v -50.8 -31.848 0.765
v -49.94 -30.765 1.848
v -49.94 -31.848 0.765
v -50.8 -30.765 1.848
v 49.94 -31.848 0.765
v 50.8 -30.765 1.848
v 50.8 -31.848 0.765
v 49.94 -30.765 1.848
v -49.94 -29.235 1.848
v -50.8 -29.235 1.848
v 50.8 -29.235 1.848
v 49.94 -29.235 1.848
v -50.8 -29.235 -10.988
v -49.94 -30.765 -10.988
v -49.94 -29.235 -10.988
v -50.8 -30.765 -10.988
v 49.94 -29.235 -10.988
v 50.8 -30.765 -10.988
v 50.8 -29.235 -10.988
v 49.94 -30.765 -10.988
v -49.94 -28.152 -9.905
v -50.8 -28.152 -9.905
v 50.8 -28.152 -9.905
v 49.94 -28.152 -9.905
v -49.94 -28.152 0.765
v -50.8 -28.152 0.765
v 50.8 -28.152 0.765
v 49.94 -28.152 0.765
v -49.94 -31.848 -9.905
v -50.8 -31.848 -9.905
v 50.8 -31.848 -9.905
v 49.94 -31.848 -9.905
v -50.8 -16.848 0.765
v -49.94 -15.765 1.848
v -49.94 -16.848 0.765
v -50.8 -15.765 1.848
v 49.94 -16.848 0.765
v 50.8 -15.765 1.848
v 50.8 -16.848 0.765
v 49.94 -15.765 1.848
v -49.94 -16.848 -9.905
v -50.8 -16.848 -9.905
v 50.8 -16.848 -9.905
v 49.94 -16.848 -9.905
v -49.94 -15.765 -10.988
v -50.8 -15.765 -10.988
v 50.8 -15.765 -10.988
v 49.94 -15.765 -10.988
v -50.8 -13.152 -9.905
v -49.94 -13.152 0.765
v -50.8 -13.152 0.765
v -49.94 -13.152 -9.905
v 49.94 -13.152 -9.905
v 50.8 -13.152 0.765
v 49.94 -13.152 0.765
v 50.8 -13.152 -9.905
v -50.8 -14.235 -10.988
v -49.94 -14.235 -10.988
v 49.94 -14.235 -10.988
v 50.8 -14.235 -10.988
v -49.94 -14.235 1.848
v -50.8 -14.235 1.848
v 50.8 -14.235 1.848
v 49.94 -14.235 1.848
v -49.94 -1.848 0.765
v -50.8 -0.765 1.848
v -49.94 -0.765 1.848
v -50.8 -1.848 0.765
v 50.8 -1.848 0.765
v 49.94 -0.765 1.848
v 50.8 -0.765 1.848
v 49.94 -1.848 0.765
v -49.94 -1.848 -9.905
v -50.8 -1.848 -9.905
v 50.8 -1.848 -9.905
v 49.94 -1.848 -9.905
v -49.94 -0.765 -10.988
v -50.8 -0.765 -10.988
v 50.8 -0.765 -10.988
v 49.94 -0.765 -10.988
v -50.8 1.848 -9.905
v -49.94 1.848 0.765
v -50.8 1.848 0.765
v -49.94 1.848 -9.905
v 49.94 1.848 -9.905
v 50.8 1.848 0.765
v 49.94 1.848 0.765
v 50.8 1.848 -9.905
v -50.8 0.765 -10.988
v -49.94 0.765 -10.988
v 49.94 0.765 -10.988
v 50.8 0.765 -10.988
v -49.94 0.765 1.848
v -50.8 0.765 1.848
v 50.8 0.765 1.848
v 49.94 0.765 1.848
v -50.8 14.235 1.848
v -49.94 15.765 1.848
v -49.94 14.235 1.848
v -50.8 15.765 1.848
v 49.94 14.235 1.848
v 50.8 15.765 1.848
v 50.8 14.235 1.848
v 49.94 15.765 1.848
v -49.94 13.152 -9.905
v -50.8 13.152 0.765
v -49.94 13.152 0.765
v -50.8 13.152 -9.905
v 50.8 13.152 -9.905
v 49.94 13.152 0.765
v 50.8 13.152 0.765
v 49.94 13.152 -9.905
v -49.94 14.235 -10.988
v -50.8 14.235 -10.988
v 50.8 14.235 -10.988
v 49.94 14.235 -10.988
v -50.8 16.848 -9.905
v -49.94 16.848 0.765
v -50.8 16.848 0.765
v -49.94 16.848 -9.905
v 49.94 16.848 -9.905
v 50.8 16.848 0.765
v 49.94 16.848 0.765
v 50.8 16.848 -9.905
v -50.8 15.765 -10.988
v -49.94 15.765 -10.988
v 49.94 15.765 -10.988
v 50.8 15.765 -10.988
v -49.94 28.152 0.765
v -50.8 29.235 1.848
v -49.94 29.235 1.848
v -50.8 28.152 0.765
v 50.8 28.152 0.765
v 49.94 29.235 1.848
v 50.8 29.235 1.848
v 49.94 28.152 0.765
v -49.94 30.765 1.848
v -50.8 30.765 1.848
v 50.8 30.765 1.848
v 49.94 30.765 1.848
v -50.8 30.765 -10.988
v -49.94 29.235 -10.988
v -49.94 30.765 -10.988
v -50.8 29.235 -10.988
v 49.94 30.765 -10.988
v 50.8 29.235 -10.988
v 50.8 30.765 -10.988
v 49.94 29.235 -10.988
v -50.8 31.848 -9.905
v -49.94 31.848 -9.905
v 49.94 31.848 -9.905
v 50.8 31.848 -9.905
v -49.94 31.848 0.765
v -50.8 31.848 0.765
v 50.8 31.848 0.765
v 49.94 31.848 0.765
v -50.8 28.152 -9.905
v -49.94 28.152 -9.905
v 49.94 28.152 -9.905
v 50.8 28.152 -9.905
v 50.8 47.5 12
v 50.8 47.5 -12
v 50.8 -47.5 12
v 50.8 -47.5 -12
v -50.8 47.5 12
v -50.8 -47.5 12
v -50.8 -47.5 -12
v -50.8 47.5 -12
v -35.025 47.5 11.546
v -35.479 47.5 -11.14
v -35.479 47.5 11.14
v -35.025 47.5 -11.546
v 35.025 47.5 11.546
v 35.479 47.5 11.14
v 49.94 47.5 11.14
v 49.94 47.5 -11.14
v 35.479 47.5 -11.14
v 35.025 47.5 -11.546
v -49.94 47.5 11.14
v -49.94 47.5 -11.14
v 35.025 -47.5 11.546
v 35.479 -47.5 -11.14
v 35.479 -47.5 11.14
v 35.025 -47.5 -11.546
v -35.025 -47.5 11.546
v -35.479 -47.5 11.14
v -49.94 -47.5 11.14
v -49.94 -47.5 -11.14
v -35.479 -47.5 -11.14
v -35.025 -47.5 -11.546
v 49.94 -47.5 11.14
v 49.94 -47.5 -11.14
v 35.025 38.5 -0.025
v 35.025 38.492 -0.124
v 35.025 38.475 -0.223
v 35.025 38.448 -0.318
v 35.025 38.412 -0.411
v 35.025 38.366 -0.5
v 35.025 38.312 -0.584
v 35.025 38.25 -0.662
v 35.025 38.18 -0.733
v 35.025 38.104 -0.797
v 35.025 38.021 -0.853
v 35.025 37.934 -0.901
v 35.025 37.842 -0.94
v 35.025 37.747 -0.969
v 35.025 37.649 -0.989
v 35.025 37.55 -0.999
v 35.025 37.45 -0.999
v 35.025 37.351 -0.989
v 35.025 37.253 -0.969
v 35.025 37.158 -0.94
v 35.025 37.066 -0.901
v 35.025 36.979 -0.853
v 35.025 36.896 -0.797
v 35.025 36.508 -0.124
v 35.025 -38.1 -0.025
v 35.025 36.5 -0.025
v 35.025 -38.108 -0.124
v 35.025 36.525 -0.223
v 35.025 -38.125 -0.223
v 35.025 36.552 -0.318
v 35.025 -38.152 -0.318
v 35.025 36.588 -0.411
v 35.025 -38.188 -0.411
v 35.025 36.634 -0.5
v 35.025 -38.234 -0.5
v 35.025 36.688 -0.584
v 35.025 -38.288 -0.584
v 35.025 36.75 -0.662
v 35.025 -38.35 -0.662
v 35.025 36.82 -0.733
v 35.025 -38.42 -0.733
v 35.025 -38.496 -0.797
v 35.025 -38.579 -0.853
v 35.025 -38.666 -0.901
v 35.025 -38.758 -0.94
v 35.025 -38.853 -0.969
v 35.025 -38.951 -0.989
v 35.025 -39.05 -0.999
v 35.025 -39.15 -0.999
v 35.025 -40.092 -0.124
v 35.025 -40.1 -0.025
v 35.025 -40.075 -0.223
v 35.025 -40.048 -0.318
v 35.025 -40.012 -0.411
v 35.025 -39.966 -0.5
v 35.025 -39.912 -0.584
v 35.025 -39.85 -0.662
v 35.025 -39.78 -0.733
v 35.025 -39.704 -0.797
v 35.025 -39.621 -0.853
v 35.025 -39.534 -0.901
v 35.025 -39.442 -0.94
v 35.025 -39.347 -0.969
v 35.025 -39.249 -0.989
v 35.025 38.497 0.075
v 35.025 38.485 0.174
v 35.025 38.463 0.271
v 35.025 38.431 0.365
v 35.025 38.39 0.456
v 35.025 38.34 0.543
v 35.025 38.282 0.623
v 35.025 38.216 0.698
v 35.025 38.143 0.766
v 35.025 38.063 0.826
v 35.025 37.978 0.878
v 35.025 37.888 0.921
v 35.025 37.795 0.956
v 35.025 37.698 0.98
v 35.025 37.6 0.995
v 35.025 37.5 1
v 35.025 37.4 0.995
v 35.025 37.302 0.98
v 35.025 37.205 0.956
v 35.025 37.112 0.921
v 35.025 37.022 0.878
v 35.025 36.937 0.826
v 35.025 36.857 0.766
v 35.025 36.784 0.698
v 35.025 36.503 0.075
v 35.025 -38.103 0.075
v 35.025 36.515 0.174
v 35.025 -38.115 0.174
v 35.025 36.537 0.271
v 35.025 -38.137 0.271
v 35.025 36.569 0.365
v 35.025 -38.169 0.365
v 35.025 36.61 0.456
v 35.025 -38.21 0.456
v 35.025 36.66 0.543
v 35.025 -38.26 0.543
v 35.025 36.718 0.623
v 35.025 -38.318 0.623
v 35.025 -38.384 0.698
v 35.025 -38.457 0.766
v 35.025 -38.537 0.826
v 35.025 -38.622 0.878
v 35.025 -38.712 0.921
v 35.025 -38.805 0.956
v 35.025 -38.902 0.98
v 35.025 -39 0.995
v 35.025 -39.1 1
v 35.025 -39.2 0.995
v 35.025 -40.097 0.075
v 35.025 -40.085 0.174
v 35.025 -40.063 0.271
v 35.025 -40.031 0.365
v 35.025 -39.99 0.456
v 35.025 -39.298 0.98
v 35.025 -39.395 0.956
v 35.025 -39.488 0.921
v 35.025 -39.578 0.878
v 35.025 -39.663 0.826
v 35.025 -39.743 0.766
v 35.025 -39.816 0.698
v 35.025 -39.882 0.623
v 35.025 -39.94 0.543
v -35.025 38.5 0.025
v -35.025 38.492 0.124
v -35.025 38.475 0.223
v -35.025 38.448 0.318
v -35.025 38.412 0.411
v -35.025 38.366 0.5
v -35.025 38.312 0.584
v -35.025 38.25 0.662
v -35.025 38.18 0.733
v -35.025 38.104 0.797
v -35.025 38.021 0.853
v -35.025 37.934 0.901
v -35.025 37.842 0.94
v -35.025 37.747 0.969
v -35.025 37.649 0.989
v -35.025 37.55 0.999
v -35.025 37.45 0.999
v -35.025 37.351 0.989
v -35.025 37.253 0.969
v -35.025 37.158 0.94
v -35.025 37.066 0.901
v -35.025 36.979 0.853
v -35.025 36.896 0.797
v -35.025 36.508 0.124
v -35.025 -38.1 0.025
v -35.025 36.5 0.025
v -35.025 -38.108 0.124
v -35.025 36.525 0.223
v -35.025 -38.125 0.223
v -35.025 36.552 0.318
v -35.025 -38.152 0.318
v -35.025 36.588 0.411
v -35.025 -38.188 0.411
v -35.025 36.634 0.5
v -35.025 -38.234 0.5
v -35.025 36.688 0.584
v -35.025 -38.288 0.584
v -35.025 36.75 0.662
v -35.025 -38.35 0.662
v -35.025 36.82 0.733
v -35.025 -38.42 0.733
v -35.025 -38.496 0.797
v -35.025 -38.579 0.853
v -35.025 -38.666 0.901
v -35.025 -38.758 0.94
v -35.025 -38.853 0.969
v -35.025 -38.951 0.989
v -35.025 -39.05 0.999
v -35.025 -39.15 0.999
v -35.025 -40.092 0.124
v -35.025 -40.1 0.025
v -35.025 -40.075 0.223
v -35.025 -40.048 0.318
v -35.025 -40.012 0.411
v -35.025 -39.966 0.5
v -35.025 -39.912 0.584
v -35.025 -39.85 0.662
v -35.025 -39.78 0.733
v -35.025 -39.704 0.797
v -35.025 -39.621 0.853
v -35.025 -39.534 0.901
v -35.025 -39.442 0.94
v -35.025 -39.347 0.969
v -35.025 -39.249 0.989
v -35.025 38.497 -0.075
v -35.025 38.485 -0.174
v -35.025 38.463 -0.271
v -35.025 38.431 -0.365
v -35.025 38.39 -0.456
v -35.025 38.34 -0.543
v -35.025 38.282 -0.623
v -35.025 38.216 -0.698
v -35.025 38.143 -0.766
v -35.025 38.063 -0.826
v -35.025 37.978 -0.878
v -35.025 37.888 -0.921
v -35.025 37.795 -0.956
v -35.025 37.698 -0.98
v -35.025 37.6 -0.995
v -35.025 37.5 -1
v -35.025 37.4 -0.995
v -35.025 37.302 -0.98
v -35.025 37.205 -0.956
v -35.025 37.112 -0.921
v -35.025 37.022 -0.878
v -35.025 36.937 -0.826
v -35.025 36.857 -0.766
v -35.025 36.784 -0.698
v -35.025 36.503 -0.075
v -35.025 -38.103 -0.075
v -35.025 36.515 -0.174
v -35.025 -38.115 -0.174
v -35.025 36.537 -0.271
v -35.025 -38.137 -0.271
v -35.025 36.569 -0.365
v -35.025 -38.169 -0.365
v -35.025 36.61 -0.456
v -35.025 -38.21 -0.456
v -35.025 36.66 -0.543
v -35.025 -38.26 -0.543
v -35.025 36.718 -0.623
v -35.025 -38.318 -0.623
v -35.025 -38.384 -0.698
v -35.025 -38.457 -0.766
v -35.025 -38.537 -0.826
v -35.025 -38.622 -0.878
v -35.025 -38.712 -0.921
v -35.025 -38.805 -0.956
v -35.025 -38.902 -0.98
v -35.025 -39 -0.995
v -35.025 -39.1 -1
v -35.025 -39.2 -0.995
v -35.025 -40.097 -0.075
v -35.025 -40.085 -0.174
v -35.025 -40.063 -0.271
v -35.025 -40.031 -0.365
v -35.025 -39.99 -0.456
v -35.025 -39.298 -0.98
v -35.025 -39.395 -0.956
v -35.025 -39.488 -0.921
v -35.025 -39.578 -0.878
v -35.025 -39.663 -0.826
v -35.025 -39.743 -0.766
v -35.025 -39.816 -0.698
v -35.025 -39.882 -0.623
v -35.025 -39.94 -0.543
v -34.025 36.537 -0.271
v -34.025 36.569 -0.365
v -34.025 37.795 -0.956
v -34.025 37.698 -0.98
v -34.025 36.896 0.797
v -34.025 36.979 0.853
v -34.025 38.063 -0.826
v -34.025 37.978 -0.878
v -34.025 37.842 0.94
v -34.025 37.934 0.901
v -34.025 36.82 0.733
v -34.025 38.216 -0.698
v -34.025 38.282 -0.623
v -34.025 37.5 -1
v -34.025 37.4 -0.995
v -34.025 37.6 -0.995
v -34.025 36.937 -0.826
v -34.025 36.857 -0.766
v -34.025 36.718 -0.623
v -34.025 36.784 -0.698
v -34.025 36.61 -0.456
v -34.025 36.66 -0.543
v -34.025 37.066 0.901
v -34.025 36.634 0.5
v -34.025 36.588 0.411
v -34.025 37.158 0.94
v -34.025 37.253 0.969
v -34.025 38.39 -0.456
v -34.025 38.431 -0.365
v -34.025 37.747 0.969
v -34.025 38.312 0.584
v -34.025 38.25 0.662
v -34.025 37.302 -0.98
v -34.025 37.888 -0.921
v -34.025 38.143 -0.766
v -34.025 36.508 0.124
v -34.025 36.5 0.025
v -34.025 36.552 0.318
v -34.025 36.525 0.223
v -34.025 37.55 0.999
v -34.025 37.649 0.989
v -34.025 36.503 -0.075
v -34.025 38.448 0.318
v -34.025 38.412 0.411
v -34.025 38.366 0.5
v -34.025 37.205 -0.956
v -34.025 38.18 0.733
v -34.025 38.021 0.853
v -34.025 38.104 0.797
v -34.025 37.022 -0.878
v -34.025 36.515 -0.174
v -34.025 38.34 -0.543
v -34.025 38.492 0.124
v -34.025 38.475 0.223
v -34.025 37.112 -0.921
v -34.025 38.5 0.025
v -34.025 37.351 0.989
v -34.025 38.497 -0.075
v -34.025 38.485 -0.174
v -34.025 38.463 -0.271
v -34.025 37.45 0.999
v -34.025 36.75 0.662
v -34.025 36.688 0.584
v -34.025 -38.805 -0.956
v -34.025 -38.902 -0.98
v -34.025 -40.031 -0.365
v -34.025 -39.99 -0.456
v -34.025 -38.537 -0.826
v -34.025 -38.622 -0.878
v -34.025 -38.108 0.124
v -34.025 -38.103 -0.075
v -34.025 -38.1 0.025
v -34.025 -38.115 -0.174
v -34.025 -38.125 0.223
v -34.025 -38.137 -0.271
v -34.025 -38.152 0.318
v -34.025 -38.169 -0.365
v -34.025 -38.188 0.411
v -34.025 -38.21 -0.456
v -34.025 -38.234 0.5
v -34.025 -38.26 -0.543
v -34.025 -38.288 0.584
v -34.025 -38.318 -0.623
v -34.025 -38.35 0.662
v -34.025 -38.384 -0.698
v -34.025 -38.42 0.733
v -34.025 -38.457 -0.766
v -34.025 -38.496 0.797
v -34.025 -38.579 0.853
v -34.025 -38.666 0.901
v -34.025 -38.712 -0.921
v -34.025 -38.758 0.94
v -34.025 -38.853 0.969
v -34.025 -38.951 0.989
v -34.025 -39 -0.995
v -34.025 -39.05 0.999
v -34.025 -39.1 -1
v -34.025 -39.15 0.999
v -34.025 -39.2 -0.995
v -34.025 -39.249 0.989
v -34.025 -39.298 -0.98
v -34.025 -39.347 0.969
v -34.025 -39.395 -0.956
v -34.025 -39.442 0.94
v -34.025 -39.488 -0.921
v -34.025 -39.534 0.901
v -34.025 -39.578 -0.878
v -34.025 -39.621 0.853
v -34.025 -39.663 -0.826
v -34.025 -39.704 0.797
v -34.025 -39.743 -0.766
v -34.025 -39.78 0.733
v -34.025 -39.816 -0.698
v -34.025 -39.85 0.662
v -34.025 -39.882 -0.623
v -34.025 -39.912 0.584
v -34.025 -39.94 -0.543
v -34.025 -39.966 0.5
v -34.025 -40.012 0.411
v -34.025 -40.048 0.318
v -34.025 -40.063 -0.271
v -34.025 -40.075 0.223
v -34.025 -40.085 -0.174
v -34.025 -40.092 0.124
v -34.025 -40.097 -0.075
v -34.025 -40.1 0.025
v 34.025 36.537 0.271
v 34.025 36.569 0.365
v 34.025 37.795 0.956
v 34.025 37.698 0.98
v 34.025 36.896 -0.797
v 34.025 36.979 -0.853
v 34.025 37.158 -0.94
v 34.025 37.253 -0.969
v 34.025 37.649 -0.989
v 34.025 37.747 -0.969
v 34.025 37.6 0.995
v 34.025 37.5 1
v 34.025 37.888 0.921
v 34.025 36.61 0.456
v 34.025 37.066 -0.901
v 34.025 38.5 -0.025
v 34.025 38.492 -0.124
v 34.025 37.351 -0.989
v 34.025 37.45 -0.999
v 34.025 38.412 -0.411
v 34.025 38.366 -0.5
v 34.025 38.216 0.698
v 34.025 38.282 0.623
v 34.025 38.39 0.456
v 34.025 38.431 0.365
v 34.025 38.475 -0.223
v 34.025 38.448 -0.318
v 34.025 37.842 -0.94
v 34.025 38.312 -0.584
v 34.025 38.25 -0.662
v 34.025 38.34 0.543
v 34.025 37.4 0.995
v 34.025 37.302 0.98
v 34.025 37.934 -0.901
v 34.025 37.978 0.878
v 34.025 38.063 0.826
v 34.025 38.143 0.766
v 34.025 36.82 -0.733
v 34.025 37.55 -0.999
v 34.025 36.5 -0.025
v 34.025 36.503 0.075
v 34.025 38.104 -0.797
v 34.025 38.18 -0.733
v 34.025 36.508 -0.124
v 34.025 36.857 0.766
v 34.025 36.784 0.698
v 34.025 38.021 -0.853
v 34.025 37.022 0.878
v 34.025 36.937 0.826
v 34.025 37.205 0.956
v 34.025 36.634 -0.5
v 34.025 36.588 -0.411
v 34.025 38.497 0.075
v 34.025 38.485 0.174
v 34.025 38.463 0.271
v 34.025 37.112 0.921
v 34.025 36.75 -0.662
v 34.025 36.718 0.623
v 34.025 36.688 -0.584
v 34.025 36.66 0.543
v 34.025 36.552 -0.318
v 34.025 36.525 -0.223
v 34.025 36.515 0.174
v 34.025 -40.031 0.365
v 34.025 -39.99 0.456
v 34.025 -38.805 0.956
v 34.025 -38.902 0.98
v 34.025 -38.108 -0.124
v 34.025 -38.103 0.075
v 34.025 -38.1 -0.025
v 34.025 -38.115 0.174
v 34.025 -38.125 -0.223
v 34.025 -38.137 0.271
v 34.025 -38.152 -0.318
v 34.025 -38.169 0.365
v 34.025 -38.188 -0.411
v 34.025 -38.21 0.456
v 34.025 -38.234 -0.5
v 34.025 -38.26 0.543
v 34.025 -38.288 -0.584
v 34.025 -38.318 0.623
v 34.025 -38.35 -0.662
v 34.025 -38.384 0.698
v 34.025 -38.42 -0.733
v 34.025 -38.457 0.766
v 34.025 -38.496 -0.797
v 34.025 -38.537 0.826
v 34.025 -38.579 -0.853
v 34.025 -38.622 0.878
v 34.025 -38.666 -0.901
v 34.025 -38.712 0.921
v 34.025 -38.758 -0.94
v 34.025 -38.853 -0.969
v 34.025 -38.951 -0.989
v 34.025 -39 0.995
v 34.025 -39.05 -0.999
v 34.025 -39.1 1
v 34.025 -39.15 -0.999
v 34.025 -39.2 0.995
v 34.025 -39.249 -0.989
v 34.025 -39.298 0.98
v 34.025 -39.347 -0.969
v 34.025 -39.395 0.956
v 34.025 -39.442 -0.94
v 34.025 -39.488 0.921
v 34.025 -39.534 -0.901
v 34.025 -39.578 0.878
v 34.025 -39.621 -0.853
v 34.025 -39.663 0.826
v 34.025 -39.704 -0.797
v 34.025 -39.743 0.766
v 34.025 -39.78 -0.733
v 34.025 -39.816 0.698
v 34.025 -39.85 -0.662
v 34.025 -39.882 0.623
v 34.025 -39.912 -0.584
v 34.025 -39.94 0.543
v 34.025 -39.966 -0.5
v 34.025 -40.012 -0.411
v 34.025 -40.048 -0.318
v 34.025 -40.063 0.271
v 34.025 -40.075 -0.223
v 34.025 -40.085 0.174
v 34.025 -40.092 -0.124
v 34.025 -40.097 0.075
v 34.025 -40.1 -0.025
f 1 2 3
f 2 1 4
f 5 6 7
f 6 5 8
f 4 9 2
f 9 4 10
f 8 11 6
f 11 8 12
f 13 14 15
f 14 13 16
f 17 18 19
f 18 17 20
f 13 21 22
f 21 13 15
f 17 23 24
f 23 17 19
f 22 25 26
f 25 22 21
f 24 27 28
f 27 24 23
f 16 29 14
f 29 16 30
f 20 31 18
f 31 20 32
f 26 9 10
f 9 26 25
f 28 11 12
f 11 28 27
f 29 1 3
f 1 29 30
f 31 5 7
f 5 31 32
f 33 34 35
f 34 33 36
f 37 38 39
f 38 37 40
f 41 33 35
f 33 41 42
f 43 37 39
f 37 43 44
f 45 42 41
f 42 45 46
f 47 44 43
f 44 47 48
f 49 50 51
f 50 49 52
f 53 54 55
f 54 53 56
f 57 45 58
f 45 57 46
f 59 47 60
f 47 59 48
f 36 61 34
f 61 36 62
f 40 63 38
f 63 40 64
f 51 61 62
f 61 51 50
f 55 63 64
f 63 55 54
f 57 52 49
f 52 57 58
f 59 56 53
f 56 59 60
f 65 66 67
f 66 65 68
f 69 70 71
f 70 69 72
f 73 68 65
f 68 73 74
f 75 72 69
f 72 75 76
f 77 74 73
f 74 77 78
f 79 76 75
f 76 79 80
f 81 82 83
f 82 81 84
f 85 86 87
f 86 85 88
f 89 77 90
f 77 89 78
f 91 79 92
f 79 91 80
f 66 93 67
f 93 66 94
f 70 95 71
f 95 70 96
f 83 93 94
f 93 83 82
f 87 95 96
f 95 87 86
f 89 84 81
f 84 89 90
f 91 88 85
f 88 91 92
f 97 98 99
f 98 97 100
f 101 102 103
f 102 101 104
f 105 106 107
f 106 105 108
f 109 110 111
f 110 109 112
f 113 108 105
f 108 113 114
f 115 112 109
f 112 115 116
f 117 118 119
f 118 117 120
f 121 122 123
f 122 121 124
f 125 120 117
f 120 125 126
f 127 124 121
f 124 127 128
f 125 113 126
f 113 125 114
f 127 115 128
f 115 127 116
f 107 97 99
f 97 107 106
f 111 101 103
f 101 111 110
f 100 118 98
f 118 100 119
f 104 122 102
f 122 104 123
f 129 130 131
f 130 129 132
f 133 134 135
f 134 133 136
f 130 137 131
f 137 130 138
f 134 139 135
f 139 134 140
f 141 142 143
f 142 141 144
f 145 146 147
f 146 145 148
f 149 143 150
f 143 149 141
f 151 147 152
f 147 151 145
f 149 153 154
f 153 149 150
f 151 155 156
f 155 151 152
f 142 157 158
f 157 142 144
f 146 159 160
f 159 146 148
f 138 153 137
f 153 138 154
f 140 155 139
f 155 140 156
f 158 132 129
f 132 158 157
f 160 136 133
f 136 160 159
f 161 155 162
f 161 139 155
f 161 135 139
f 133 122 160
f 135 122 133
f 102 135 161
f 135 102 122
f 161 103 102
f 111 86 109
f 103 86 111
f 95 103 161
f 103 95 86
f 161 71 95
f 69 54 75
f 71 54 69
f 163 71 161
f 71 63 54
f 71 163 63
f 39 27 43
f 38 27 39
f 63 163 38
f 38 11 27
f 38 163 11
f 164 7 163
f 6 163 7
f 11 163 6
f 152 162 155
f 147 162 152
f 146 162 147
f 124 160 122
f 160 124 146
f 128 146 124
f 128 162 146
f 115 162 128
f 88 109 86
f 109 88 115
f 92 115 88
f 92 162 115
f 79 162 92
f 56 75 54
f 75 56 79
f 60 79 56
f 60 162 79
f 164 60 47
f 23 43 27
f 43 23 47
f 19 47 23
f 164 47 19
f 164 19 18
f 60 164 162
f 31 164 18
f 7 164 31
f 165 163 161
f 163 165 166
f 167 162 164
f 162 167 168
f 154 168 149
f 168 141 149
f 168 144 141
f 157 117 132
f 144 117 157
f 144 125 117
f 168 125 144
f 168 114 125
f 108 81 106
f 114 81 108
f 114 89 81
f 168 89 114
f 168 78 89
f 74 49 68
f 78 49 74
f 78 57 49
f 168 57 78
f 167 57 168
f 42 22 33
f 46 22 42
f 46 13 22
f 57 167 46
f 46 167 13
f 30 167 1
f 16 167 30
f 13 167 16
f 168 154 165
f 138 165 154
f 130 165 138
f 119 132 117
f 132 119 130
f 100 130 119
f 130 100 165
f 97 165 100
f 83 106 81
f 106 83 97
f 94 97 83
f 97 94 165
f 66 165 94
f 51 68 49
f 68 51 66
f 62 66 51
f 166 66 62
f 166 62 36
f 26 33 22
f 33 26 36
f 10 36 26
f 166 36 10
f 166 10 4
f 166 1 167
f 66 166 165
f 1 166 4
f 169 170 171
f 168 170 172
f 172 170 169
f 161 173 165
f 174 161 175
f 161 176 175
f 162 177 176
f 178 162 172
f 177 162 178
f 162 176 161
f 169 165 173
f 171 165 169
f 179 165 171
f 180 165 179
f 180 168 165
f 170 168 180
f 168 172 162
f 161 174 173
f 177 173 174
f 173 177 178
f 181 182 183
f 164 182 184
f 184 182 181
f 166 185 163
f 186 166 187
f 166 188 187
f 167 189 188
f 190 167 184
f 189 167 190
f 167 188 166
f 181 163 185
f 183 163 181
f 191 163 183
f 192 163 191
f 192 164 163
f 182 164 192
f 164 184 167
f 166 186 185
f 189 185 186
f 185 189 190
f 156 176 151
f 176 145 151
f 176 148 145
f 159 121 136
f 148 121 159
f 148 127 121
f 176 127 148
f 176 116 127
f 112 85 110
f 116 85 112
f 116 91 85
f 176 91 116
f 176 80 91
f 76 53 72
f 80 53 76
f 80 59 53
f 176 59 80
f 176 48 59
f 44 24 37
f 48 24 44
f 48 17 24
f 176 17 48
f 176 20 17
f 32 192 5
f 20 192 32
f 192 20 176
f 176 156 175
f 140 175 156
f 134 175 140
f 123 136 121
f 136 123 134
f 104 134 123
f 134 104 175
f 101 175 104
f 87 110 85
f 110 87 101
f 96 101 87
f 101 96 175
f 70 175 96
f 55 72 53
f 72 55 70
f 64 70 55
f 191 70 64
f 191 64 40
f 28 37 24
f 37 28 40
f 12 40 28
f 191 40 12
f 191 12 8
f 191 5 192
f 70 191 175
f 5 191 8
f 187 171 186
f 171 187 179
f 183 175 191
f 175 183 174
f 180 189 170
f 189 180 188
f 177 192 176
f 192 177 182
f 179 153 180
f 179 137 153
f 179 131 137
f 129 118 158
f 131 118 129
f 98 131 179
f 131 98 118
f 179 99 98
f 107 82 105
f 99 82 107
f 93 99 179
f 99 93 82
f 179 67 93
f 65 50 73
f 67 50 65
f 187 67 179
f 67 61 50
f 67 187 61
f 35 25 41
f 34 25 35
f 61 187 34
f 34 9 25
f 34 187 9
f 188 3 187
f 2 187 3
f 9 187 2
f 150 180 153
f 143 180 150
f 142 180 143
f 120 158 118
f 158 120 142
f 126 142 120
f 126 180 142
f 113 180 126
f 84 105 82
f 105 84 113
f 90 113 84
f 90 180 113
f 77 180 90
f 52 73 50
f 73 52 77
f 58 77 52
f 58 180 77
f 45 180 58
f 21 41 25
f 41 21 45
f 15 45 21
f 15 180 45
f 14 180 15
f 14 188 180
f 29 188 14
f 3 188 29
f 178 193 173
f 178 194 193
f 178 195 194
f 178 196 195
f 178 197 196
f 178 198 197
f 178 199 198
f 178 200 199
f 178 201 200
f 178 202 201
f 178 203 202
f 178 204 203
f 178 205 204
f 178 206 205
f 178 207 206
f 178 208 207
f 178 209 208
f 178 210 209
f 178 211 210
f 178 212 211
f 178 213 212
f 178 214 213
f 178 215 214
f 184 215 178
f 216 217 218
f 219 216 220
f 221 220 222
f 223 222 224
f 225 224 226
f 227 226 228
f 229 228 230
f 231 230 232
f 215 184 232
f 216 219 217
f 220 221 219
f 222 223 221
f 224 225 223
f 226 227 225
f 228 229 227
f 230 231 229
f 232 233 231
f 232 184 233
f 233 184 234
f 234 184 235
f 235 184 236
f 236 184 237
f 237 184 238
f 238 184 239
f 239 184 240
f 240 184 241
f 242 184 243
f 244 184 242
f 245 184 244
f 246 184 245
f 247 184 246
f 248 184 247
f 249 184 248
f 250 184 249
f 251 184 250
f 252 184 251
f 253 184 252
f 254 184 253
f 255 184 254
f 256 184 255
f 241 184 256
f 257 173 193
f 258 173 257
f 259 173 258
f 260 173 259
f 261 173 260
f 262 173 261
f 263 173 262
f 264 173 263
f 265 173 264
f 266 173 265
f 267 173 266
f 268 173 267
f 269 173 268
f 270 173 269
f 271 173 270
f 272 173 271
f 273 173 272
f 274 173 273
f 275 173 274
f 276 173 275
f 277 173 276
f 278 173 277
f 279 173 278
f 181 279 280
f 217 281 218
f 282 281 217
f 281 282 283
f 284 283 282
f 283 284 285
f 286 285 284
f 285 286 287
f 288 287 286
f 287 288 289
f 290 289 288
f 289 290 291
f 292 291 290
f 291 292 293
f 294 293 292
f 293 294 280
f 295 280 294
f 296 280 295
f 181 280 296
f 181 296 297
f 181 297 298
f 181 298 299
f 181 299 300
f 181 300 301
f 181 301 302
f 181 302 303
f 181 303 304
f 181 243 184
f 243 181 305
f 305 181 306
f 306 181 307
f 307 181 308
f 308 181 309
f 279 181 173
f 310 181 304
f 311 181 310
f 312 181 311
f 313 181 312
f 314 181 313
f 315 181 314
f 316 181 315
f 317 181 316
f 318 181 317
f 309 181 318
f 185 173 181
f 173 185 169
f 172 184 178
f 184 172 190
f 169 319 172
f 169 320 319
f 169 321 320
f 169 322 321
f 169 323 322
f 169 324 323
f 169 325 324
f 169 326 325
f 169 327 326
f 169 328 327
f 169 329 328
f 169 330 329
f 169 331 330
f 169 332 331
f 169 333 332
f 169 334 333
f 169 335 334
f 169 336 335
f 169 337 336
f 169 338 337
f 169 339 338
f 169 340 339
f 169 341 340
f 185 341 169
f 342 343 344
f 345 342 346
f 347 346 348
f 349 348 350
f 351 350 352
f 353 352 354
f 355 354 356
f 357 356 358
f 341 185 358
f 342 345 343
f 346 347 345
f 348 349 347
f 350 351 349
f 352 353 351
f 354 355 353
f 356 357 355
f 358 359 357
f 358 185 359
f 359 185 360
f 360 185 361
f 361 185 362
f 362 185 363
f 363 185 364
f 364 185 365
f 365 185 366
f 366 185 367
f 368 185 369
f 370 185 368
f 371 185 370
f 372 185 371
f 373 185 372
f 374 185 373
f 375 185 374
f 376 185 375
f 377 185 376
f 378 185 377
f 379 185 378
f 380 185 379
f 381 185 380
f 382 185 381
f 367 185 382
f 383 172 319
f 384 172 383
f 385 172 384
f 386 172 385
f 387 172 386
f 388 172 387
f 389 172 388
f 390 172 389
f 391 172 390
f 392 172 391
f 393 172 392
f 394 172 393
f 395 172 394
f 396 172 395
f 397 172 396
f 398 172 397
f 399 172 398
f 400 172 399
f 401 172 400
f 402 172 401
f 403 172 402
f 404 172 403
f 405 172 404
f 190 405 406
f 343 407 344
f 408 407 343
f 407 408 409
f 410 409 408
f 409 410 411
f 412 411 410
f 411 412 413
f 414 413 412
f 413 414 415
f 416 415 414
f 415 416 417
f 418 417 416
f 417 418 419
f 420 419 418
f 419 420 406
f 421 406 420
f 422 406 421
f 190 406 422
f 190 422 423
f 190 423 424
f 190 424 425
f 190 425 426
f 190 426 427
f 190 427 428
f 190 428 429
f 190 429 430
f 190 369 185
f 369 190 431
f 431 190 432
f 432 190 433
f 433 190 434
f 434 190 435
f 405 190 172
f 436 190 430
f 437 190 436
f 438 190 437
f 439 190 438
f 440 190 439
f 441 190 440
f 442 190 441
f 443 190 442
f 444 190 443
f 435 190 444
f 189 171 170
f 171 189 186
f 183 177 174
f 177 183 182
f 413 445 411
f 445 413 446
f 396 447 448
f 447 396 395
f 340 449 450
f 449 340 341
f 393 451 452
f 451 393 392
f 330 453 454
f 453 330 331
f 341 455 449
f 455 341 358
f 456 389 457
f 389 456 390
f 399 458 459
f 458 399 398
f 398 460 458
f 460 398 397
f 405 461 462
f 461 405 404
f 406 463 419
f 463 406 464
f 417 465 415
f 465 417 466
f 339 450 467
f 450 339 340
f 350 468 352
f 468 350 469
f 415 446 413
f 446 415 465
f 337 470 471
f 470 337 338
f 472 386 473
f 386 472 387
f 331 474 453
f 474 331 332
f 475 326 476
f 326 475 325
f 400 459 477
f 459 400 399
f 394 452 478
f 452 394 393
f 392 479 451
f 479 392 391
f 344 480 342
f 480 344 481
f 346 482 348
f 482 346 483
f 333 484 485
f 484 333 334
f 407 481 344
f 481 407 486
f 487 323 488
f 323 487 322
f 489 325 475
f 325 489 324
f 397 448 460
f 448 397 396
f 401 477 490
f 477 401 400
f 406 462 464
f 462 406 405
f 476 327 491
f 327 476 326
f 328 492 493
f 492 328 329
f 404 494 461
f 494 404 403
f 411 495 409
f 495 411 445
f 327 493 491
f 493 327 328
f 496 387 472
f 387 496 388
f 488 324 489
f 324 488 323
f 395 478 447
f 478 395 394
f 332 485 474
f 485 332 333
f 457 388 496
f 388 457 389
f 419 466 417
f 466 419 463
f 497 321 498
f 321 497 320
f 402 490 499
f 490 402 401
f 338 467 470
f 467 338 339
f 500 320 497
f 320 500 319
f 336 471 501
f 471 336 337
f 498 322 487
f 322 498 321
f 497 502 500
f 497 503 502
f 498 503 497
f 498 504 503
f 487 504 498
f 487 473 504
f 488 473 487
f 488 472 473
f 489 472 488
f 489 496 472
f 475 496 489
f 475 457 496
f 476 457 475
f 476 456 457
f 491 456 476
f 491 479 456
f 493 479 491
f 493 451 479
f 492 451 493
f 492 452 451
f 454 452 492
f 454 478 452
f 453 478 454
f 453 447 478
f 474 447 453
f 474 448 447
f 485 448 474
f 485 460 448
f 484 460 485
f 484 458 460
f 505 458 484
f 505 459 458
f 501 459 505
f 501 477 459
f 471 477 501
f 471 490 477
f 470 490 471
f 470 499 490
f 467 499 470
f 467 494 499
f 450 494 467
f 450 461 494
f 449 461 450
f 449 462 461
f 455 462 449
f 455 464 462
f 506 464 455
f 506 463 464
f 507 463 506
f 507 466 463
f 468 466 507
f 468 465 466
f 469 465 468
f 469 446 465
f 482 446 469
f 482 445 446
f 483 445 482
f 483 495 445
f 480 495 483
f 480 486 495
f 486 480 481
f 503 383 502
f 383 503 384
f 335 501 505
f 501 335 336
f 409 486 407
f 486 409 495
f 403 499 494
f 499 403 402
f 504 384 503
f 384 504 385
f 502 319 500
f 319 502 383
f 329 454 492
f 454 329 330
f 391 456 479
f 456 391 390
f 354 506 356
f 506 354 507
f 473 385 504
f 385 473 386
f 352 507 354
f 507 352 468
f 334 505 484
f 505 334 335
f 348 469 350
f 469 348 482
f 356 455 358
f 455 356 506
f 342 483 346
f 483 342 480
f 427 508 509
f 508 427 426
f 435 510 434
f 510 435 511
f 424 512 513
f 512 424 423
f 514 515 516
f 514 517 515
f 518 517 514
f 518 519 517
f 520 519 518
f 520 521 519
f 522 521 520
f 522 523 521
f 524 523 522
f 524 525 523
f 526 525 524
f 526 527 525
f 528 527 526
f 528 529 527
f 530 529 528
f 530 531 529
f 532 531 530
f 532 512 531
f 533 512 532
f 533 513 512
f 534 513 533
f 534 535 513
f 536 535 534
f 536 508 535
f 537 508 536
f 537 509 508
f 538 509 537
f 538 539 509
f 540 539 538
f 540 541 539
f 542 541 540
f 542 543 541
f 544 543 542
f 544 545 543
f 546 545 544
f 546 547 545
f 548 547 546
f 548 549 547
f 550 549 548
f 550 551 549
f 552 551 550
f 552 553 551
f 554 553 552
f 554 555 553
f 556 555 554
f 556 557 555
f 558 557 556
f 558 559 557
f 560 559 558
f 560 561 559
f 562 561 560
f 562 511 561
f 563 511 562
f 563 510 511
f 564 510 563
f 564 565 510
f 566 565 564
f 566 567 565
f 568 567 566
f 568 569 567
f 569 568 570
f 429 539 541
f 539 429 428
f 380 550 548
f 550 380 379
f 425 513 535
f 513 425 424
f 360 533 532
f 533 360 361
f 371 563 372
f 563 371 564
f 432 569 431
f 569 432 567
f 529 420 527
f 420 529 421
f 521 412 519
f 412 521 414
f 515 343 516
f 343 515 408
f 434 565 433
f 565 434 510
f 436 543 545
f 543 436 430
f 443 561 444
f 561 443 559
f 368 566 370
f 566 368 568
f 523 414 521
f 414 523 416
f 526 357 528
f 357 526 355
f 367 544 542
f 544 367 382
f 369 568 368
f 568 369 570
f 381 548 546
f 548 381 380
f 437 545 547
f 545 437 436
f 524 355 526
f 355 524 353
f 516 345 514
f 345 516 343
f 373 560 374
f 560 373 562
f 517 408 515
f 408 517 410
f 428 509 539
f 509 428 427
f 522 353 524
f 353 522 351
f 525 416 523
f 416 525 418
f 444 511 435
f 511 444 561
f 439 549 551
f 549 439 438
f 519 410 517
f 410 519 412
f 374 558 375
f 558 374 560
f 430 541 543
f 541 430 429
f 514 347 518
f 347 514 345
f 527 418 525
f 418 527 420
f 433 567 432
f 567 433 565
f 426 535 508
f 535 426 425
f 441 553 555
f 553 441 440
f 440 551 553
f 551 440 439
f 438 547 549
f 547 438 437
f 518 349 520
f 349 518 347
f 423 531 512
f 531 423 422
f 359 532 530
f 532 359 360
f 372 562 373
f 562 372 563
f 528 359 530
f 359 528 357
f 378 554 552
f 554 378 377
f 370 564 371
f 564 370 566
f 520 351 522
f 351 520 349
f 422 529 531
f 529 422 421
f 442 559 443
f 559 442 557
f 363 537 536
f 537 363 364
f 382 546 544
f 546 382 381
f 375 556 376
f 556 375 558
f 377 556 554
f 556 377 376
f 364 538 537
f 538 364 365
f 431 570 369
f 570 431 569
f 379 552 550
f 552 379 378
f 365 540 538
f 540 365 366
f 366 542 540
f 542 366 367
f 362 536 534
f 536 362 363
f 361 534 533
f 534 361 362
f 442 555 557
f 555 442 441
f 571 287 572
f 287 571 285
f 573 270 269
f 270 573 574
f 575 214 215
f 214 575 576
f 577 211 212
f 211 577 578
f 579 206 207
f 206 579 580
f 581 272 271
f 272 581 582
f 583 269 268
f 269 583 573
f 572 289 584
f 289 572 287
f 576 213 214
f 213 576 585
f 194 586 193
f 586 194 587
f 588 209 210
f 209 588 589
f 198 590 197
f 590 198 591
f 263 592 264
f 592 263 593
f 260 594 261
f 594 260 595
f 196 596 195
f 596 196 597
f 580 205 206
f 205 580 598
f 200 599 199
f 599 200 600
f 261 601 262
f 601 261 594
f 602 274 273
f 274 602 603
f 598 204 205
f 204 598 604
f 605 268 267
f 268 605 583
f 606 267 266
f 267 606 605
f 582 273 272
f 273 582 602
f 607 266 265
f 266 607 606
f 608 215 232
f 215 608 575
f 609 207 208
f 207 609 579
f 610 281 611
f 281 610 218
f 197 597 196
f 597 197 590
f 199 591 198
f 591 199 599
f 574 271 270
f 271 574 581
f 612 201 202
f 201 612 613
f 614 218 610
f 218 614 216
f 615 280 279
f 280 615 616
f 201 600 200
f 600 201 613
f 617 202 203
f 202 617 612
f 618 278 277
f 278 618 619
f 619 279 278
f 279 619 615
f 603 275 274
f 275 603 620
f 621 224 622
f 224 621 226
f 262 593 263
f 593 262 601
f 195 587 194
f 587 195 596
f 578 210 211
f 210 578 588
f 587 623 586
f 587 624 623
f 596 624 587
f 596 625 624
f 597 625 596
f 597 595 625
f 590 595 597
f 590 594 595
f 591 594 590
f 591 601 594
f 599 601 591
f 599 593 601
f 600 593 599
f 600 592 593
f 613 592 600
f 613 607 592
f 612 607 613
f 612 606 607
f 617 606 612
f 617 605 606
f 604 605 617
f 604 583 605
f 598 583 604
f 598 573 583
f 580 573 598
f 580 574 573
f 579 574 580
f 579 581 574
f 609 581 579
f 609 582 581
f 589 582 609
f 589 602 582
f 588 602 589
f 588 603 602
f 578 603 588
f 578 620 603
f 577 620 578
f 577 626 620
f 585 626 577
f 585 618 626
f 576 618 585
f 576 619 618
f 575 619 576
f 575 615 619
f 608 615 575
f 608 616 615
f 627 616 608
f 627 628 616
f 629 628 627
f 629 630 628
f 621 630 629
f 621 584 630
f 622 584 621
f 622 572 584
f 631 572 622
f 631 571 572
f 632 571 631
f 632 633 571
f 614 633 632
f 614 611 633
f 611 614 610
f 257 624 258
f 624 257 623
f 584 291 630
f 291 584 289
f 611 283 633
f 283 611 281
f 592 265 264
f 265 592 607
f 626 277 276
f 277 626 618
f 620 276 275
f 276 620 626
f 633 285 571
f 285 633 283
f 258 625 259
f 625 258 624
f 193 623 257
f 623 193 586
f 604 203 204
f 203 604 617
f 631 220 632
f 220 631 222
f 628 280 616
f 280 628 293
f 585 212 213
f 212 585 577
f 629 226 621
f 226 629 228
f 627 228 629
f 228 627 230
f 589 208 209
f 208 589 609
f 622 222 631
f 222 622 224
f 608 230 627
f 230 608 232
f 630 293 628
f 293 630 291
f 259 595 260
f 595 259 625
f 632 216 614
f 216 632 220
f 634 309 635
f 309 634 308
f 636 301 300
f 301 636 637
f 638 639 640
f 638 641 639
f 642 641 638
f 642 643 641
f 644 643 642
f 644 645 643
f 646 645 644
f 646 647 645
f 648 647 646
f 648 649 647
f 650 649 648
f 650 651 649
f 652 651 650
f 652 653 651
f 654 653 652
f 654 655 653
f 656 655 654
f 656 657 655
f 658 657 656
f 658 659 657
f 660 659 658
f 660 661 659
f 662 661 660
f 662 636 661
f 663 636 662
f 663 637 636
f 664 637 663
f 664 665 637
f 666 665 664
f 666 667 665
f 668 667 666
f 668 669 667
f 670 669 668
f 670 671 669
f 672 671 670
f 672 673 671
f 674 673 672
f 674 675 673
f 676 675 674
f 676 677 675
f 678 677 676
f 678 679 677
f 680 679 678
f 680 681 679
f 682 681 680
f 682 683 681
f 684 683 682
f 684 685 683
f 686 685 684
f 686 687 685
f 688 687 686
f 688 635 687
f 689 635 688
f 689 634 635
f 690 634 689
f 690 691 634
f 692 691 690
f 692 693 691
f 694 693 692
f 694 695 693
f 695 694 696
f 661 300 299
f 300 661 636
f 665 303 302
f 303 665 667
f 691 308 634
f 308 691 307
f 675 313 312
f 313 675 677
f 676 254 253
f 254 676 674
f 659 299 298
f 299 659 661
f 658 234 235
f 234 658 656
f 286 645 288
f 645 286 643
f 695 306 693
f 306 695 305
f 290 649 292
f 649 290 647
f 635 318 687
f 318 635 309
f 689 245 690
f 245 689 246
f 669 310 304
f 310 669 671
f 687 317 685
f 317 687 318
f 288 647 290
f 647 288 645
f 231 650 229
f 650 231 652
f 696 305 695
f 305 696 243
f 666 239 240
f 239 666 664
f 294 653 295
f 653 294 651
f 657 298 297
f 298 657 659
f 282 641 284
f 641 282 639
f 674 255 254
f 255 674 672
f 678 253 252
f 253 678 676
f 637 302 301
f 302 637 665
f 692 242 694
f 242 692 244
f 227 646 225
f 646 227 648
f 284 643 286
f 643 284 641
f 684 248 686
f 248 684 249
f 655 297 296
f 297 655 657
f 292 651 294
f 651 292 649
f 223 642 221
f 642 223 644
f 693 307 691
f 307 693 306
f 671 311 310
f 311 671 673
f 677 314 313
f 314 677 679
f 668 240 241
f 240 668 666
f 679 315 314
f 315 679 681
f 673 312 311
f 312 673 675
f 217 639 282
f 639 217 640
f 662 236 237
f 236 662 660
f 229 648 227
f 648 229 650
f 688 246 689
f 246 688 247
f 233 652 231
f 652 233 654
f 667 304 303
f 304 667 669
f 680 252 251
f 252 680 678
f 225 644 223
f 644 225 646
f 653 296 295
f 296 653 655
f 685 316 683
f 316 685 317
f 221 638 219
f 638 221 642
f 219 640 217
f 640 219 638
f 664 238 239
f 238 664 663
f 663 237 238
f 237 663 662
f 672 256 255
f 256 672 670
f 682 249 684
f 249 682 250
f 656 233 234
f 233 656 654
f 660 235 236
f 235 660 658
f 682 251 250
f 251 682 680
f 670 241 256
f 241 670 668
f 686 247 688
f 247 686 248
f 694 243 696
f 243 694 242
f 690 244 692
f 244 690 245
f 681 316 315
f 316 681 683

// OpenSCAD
$fa = .01;
$fs = $preview ? 1 : .1;

inch=25.4;

twt=.86;
twt2=.454;
// Overall Outter frame dimensions.  Should match that of 5.25" drive 
height = 24;
width = 4*inch;
depth = 95;

//  Settings for internal size.  Should fit a 3.5" HDD
Iwidth = 2.75*inch+.2;
BedThickness = twt;
WallThickness = twt;

// Settings for the depth of the outter screw holes.
OSDepth1 = 11.5;
OSDepth2 = OSDepth1 + 30;
OSHeight1 = 6.35;
OSDiamater = 4;

// Settings for the bottom screw holes of sled
BOSDepth1 = 24.28;
BOSDepth2 = BOSDepth1 + 44.45;


// Inner screw nibs
HDDepth1 = 10;
HDDepth2 = HDDepth1 + 76.6;
HDHeight = (BedThickness + height)/2;
NubLength = 1;
NubWidth = 2;


difference(){
    //outer
    cube([width,depth,height], center=true);
    //void
    cube([width-2*twt,depth+.2,height-2*twt], center=true);
    cube([Iwidth,depth+.2,height-(2*twt2)], center=true);
    //slots
    for(i=[-2:2]) hull(){
        dy=i*15;
        translate([0,dy,0])
            rotate([0,90,0])
            rotate([0,0,360/16])
            cylinder(h=width+.2,d=OSDiamater,center=true, $fn=8);
        translate([0,dy,-(height/2-twt-OSDiamater/2)])
            rotate([0,90,0])
            rotate([0,0,360/16])
            cylinder(h=width+.2,d=OSDiamater,center=true, $fn=8);
    }
}
for(i=[-1,1])
    translate([i*(Iwidth/2+twt2/2),0,0])
    cube([twt2,depth,height],center=true);

//nubs
for(i=[-1,1], dy=[depth/2-HDDepth1,depth/2-HDDepth2])
    translate([i*Iwidth/2,dy,0])
    rotate([0,-90*i,0])
    cylinder(h=NubLength, d=NubWidth);
